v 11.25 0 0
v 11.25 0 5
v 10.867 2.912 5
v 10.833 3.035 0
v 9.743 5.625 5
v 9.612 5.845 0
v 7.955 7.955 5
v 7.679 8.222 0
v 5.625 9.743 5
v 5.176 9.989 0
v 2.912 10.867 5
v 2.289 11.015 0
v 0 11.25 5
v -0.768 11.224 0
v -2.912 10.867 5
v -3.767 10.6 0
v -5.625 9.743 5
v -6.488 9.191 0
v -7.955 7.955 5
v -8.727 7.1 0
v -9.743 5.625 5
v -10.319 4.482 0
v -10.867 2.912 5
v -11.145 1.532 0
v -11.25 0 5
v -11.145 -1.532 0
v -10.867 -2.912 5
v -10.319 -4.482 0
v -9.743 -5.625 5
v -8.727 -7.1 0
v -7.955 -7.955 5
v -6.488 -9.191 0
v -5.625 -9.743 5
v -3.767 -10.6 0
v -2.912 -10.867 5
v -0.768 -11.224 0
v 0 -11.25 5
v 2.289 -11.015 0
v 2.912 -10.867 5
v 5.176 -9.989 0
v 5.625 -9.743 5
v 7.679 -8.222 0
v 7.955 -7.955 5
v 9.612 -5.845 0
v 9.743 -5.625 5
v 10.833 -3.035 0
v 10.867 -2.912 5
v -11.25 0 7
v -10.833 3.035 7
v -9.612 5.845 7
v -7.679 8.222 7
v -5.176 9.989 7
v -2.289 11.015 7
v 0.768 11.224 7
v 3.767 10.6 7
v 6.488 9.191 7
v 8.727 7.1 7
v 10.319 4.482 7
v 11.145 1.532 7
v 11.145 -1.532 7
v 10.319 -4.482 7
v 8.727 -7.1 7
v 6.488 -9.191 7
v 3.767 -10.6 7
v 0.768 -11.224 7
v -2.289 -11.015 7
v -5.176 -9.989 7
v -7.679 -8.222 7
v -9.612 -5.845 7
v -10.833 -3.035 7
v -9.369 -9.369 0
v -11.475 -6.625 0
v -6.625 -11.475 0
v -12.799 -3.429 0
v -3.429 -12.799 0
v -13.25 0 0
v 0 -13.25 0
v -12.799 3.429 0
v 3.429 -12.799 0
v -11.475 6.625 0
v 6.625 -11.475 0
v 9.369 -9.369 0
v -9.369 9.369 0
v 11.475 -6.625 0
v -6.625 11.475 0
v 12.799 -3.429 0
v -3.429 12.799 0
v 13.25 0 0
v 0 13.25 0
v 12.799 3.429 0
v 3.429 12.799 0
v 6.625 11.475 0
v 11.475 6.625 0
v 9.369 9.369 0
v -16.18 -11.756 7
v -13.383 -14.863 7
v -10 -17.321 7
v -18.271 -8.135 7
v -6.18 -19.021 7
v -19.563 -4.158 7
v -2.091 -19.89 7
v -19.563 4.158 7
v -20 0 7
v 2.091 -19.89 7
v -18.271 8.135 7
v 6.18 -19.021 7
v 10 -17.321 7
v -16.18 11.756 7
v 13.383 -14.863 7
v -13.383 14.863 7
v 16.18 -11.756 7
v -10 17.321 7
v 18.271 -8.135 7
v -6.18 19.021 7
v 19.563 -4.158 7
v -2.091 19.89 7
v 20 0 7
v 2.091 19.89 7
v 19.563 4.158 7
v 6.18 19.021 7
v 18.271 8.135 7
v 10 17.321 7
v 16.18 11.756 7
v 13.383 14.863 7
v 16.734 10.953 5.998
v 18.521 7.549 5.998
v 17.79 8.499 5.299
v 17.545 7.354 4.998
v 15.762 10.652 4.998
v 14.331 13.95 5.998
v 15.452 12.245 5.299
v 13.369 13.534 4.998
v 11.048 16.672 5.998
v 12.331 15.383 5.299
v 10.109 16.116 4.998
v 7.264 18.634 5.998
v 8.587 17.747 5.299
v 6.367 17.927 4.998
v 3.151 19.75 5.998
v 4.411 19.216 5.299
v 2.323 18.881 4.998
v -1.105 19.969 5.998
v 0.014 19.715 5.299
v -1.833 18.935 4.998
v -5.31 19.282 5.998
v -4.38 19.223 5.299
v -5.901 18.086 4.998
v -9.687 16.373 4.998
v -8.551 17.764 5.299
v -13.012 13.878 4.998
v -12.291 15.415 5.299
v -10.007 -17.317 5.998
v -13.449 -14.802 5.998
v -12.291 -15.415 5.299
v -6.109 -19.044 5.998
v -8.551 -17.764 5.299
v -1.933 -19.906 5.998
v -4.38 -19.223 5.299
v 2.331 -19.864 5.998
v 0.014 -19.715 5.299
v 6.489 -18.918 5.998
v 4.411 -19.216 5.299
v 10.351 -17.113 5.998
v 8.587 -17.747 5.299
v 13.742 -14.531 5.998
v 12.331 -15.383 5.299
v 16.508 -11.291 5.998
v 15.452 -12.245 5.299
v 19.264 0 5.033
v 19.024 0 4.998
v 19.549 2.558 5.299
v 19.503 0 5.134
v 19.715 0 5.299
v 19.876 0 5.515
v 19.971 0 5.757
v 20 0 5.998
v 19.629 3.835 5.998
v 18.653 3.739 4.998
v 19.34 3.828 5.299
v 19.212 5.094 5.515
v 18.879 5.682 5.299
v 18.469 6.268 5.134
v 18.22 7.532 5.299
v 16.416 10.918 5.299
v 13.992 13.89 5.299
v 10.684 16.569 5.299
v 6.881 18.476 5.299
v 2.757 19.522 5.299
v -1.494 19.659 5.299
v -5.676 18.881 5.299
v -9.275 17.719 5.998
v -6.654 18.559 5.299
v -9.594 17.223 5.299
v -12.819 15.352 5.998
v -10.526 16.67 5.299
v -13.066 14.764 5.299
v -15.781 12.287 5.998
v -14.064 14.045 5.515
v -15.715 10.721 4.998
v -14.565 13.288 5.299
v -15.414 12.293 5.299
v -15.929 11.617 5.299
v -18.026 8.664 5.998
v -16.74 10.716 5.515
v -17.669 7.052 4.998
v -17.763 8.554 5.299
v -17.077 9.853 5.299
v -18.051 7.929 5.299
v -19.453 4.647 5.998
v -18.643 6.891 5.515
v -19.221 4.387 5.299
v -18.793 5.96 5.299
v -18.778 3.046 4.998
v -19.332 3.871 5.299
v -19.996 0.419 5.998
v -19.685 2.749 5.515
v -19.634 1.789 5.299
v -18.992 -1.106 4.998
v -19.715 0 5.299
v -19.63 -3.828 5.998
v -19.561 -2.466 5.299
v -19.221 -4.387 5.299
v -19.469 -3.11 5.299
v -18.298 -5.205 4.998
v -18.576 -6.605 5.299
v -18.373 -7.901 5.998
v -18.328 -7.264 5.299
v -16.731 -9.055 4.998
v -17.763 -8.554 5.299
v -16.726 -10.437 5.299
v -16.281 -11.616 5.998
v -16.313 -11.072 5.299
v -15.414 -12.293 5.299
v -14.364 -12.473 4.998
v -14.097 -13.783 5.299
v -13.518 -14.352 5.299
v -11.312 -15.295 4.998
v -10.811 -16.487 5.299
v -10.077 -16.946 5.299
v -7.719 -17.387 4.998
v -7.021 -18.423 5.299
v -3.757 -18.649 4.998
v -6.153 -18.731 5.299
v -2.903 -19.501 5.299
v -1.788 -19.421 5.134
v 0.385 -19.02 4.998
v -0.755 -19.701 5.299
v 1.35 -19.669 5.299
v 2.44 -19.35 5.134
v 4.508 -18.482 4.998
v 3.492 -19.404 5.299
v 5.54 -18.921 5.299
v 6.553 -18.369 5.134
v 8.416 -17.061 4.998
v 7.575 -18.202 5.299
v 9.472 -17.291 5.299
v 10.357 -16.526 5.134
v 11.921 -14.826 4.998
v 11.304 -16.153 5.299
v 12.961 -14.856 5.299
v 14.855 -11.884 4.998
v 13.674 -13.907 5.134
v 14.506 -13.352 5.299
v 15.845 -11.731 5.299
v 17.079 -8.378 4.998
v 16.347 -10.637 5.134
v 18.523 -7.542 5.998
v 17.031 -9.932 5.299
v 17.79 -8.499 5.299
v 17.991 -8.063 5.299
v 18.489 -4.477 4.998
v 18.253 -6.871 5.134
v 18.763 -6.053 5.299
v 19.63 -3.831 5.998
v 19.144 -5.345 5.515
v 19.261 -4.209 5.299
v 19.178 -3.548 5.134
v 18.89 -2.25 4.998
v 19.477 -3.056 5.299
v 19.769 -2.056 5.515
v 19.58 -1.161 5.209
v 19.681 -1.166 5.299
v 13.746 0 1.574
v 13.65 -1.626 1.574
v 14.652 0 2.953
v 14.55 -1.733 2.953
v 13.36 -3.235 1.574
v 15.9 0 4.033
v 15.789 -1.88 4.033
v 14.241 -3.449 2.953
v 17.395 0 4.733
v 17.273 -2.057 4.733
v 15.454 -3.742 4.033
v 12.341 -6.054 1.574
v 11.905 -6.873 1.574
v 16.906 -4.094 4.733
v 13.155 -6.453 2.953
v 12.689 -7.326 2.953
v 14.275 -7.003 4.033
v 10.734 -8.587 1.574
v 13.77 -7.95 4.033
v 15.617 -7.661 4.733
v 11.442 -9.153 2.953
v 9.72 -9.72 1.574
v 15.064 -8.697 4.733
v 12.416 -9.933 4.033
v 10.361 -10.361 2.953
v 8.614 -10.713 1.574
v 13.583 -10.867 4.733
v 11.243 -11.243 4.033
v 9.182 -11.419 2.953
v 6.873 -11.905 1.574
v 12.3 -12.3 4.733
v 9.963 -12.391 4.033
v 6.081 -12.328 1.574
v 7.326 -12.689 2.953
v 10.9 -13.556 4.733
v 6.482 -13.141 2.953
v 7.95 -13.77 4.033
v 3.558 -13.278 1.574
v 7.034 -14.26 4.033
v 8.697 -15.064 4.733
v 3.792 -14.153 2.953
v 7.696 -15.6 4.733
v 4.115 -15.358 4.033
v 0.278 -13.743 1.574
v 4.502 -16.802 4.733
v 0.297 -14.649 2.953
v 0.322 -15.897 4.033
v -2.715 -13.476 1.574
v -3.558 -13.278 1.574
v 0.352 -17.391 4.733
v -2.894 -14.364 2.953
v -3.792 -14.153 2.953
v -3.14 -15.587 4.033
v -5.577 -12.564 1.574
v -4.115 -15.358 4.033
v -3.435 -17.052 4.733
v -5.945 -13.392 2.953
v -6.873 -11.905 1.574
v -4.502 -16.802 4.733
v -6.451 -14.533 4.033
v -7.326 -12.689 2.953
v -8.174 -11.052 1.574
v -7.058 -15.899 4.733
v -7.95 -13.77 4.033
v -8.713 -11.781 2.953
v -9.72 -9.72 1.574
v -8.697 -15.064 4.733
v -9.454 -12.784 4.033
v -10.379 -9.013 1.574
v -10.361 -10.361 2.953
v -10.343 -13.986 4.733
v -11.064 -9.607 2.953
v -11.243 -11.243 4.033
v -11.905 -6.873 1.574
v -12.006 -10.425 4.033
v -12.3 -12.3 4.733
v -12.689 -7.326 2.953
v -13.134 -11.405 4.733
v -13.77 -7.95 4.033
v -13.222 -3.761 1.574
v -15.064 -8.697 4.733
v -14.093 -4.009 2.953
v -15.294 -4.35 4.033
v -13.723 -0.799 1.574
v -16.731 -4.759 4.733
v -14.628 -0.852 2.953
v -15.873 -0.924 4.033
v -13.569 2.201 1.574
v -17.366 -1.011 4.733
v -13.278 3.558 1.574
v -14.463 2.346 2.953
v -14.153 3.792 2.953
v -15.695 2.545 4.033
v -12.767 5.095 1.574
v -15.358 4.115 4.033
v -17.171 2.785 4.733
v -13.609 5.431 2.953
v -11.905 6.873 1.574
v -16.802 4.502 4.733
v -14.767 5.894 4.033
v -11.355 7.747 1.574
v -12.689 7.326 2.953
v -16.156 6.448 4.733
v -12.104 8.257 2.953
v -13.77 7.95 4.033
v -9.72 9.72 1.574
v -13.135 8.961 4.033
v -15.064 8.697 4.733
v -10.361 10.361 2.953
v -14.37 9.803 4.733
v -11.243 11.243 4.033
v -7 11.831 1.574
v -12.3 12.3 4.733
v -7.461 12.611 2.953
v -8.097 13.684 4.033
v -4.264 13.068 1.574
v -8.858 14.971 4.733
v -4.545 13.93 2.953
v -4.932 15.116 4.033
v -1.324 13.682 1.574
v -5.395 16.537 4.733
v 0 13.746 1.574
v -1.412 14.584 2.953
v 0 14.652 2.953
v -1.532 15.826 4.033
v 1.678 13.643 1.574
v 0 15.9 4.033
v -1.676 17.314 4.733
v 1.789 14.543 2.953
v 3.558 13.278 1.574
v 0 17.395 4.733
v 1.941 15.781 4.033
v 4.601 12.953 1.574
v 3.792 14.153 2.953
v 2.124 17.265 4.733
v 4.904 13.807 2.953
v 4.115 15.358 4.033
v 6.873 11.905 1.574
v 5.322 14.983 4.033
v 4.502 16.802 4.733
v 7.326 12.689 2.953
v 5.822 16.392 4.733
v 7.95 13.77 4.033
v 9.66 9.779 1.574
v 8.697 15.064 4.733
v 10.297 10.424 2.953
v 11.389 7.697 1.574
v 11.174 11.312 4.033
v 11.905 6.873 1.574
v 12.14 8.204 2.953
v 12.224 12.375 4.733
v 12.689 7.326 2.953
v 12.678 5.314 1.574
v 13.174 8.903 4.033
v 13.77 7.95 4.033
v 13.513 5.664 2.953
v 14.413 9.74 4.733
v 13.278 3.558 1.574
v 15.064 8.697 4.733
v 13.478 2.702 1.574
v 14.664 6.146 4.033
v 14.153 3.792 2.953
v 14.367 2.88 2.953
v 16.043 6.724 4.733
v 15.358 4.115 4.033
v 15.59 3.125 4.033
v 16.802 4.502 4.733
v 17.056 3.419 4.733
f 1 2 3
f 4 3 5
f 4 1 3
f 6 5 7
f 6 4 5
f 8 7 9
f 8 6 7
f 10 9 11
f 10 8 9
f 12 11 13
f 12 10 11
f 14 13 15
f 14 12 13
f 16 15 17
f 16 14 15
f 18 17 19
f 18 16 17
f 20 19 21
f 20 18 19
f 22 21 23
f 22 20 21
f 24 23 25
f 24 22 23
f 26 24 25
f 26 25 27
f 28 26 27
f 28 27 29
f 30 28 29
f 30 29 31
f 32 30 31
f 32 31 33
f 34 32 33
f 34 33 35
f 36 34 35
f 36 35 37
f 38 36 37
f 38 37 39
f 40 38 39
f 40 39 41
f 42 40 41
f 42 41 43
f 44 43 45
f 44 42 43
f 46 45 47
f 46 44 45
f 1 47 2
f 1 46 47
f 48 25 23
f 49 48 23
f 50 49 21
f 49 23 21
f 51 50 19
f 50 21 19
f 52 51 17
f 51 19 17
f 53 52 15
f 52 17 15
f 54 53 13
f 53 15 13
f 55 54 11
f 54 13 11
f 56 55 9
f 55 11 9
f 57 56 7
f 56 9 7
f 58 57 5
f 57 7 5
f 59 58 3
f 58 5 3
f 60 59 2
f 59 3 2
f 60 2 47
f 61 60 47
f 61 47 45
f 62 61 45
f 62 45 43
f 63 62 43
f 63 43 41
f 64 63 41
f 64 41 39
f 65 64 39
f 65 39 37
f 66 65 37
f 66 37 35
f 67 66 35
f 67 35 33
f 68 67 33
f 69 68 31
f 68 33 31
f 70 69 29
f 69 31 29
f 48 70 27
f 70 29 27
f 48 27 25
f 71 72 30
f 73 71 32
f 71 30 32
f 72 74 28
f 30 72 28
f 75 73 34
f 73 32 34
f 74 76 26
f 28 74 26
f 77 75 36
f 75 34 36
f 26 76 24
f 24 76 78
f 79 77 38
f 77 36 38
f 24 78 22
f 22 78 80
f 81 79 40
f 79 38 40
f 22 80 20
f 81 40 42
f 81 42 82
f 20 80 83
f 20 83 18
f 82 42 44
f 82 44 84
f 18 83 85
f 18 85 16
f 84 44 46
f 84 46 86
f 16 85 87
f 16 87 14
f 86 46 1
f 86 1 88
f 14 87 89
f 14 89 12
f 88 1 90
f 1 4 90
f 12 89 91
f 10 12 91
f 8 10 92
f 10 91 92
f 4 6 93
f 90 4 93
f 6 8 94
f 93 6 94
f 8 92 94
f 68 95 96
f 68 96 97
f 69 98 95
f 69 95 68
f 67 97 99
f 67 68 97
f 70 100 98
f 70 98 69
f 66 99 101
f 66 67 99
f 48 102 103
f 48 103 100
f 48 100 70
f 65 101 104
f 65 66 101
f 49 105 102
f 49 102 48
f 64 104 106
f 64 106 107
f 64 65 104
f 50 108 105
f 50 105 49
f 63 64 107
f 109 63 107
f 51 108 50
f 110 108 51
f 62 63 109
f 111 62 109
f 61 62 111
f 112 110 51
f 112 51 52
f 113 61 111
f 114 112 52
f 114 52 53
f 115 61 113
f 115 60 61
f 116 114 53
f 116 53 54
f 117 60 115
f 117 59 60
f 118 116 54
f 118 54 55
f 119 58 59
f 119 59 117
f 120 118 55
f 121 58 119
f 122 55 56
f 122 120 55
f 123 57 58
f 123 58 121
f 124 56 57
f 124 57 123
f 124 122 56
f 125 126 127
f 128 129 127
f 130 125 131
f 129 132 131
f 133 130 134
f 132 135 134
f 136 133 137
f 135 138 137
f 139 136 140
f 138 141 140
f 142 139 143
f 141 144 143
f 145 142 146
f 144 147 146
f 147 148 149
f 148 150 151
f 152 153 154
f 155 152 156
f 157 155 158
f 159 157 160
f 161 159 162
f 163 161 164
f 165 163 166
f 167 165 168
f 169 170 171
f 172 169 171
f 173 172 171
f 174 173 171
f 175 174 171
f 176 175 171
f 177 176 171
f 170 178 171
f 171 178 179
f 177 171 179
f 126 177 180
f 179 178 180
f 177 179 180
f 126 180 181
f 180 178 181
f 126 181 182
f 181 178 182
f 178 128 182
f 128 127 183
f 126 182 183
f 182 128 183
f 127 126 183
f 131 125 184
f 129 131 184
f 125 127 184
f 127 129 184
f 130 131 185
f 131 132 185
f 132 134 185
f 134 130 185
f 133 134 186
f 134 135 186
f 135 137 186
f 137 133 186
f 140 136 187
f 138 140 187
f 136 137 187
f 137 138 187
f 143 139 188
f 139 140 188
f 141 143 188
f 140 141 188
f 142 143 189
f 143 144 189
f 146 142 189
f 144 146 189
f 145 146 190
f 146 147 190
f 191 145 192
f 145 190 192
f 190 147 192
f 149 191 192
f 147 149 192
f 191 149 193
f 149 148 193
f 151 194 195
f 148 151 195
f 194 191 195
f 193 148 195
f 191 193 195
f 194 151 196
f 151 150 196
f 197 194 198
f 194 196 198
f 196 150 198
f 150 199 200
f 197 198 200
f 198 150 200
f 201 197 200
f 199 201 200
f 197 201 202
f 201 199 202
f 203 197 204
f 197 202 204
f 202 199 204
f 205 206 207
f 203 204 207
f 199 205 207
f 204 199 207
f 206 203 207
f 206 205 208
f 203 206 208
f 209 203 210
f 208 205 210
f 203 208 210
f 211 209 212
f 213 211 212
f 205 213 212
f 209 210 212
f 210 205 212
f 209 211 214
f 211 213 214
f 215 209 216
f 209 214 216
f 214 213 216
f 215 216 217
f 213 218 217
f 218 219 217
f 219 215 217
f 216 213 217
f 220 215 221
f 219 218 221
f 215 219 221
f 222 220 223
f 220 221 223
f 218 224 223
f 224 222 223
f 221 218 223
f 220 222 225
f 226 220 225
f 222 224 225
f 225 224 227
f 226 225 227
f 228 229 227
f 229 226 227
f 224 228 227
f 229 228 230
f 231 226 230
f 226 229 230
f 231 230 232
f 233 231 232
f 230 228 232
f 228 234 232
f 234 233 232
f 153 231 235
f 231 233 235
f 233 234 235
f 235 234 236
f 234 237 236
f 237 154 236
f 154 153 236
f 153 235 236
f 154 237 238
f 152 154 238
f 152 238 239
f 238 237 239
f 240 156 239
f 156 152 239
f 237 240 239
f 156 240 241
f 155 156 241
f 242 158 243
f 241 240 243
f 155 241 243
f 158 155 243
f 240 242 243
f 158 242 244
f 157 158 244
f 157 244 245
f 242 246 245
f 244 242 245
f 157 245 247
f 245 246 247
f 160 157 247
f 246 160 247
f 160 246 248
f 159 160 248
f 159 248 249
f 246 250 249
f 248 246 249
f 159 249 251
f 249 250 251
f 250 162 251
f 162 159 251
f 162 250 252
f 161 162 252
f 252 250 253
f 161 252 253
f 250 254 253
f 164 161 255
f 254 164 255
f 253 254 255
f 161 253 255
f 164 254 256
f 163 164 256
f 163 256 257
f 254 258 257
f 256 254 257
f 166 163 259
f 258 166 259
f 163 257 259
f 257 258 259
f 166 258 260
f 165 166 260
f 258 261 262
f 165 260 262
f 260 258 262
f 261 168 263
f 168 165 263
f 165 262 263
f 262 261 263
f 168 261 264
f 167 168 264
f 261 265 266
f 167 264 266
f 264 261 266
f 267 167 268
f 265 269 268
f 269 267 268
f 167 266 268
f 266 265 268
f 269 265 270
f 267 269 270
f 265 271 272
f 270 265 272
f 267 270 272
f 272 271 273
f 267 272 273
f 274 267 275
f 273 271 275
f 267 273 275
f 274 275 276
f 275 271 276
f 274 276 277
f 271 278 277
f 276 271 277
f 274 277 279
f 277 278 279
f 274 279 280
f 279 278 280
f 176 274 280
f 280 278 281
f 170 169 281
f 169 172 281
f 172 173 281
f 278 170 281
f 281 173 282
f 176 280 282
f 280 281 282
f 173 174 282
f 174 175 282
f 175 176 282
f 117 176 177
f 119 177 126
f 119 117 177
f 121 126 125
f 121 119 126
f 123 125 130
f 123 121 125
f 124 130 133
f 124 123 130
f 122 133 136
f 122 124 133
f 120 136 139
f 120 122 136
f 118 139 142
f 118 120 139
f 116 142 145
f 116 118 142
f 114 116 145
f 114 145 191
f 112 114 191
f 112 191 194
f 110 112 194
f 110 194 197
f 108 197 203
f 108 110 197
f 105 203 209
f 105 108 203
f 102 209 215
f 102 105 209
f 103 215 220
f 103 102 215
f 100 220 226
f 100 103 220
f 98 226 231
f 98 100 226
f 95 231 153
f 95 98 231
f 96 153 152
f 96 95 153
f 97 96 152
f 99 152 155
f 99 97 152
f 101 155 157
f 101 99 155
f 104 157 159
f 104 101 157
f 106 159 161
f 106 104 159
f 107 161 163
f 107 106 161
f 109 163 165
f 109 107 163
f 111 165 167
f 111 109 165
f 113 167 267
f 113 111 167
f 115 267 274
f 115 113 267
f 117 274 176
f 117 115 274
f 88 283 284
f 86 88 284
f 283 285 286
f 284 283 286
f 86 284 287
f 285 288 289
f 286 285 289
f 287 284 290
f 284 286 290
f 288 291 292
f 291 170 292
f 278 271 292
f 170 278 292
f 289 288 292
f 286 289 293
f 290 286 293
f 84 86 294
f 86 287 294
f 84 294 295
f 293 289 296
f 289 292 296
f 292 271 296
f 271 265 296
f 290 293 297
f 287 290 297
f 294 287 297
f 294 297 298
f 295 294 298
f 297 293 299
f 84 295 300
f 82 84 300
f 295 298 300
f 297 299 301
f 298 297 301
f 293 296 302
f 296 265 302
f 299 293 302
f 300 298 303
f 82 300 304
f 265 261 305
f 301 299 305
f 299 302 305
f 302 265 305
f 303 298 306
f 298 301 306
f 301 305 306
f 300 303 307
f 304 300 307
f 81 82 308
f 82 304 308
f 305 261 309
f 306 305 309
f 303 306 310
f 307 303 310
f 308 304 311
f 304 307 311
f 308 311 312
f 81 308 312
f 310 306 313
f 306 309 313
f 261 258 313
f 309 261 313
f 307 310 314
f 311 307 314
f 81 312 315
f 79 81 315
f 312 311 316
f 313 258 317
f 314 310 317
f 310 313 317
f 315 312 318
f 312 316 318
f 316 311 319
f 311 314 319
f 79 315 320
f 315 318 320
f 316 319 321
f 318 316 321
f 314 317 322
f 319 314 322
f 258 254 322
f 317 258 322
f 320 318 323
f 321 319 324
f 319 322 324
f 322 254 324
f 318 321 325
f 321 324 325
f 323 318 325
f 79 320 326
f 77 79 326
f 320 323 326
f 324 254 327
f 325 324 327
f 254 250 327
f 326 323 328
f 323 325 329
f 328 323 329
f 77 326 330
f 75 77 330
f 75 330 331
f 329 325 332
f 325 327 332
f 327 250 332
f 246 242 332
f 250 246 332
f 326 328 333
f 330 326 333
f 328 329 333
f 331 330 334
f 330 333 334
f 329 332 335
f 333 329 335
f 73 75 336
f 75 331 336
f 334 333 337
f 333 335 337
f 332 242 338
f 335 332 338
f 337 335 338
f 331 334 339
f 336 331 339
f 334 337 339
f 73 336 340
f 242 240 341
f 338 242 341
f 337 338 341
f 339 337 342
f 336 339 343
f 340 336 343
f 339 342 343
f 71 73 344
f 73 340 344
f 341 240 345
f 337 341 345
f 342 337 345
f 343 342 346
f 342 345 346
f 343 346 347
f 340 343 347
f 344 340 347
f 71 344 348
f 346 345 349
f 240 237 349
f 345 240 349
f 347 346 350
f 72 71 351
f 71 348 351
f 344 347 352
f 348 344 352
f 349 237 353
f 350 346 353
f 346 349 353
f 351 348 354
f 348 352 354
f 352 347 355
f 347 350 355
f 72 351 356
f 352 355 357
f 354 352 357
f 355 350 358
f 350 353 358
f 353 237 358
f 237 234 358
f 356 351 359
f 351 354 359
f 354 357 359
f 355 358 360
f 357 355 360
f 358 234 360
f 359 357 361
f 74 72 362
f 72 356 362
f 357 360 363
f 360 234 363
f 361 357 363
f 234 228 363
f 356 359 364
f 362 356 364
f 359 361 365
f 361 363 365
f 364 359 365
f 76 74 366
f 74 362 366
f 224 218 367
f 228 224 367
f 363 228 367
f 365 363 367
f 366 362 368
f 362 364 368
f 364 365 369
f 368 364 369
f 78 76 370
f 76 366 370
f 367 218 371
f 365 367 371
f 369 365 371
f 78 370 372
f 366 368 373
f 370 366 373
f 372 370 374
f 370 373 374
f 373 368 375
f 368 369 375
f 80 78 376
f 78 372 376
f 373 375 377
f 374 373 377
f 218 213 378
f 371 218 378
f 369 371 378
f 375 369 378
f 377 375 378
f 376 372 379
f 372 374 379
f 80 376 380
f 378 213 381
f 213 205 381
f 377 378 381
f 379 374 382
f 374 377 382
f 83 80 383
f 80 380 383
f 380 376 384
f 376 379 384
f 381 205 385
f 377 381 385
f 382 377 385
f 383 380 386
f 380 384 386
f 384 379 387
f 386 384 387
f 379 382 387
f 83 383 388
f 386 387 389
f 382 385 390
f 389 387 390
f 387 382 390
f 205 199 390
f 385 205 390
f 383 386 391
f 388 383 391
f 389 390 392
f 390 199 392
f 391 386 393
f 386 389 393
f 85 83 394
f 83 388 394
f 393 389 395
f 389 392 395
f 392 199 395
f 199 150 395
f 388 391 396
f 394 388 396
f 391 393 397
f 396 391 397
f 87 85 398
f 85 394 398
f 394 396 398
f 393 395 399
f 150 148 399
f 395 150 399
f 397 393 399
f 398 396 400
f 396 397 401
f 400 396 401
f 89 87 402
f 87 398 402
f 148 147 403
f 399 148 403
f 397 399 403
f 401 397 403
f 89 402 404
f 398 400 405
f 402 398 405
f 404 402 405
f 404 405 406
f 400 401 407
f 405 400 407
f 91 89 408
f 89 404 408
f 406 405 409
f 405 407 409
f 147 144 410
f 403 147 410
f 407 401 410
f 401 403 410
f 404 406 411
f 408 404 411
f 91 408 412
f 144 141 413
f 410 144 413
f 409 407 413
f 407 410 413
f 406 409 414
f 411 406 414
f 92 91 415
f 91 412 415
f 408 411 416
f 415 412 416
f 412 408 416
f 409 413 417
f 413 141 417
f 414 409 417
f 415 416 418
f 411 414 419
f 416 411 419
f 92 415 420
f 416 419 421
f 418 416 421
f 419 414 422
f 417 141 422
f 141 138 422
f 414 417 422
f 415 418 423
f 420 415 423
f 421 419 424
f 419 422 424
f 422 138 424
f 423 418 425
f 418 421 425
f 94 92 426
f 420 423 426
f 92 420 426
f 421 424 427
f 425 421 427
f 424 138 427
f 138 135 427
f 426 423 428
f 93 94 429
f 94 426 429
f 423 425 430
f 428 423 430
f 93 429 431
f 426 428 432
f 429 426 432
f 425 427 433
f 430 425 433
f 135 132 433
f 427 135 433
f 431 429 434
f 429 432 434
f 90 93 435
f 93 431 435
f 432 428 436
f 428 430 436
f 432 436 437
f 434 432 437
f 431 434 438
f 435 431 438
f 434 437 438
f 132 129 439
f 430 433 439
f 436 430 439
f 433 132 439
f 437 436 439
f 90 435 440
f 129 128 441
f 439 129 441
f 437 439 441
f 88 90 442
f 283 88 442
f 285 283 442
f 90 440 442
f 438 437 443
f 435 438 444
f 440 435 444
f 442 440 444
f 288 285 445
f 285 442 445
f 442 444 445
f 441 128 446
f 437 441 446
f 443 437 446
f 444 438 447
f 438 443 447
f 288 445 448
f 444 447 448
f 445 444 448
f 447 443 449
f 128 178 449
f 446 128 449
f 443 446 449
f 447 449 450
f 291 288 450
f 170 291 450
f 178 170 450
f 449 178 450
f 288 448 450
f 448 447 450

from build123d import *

# Parameters (mm, degrees)
SKETCH1_R           = 13.25
SKETCH1_R_2         = 11.25
BOSS_EXTRUDE1_DEPTH = 7
SKETCH2_R           = 20
BOSS_EXTRUDE2_DEPTH = 2
FILLET1_R           = 6
SKETCH3_R           = 11.25
CUT_EXTRUDE1_DEPTH  = 2
FILLET2_R           = 1


with BuildPart() as part:
    # Sketch1 → Boss-Extrude1 (new body)
    with BuildSketch(Plane.XY):
        Circle(SKETCH1_R)
        Circle(SKETCH1_R_2, mode=Mode.SUBTRACT)
    extrude(amount=BOSS_EXTRUDE1_DEPTH)

    # Sketch2 → Boss-Extrude2 (add)
    with BuildSketch(Plane.XY.offset(7)):
        Circle(SKETCH2_R)
    extrude(amount=-BOSS_EXTRUDE2_DEPTH)

    # Fillet1
    # the kernel refuses this fillet: 6 mm, written as the material it adds along each edge
    with BuildSketch(Plane(origin=(0, 0, 5), x_dir=(1, 0, 0), z_dir=(0, 1, 0))) as fillet1_piece_1:
        with BuildLine():
            CenterArc((19.166079783, 6), FILLET1_R, 189.594068227, 80.405931773)
            Line((19.166079783, 0), (19.166079783, -0.12))
            Line((19.166079783, -0.12), (13.25, -0.12))
            Line((13.25, -0.12), (13.13, 0))
            ThreePointArc((13.13, 0), (13.13, 2.5), (13.131678404, 4.98))
            Line((13.131678404, 4.98), (13.25, 5))
        make_face()
    revolve(axis=Axis((0, 0, 5), (0, 0, -1)))

    # Sketch3 → Cut-Extrude1 (cut)
    with BuildSketch(Plane(origin=(0, 0, 5), x_dir=(-1, 0, 0), z_dir=(0, 0, -1))):
        Circle(SKETCH3_R)
    extrude(amount=-CUT_EXTRUDE1_DEPTH, mode=Mode.SUBTRACT)

    # Fillet2
    fillet2_edges = [part.edges().sort_by_distance(p)[0] for p in [
        (-20, 0, 5),
    ]]
    fillet(fillet2_edges, radius=FILLET2_R)


solid = part.part
